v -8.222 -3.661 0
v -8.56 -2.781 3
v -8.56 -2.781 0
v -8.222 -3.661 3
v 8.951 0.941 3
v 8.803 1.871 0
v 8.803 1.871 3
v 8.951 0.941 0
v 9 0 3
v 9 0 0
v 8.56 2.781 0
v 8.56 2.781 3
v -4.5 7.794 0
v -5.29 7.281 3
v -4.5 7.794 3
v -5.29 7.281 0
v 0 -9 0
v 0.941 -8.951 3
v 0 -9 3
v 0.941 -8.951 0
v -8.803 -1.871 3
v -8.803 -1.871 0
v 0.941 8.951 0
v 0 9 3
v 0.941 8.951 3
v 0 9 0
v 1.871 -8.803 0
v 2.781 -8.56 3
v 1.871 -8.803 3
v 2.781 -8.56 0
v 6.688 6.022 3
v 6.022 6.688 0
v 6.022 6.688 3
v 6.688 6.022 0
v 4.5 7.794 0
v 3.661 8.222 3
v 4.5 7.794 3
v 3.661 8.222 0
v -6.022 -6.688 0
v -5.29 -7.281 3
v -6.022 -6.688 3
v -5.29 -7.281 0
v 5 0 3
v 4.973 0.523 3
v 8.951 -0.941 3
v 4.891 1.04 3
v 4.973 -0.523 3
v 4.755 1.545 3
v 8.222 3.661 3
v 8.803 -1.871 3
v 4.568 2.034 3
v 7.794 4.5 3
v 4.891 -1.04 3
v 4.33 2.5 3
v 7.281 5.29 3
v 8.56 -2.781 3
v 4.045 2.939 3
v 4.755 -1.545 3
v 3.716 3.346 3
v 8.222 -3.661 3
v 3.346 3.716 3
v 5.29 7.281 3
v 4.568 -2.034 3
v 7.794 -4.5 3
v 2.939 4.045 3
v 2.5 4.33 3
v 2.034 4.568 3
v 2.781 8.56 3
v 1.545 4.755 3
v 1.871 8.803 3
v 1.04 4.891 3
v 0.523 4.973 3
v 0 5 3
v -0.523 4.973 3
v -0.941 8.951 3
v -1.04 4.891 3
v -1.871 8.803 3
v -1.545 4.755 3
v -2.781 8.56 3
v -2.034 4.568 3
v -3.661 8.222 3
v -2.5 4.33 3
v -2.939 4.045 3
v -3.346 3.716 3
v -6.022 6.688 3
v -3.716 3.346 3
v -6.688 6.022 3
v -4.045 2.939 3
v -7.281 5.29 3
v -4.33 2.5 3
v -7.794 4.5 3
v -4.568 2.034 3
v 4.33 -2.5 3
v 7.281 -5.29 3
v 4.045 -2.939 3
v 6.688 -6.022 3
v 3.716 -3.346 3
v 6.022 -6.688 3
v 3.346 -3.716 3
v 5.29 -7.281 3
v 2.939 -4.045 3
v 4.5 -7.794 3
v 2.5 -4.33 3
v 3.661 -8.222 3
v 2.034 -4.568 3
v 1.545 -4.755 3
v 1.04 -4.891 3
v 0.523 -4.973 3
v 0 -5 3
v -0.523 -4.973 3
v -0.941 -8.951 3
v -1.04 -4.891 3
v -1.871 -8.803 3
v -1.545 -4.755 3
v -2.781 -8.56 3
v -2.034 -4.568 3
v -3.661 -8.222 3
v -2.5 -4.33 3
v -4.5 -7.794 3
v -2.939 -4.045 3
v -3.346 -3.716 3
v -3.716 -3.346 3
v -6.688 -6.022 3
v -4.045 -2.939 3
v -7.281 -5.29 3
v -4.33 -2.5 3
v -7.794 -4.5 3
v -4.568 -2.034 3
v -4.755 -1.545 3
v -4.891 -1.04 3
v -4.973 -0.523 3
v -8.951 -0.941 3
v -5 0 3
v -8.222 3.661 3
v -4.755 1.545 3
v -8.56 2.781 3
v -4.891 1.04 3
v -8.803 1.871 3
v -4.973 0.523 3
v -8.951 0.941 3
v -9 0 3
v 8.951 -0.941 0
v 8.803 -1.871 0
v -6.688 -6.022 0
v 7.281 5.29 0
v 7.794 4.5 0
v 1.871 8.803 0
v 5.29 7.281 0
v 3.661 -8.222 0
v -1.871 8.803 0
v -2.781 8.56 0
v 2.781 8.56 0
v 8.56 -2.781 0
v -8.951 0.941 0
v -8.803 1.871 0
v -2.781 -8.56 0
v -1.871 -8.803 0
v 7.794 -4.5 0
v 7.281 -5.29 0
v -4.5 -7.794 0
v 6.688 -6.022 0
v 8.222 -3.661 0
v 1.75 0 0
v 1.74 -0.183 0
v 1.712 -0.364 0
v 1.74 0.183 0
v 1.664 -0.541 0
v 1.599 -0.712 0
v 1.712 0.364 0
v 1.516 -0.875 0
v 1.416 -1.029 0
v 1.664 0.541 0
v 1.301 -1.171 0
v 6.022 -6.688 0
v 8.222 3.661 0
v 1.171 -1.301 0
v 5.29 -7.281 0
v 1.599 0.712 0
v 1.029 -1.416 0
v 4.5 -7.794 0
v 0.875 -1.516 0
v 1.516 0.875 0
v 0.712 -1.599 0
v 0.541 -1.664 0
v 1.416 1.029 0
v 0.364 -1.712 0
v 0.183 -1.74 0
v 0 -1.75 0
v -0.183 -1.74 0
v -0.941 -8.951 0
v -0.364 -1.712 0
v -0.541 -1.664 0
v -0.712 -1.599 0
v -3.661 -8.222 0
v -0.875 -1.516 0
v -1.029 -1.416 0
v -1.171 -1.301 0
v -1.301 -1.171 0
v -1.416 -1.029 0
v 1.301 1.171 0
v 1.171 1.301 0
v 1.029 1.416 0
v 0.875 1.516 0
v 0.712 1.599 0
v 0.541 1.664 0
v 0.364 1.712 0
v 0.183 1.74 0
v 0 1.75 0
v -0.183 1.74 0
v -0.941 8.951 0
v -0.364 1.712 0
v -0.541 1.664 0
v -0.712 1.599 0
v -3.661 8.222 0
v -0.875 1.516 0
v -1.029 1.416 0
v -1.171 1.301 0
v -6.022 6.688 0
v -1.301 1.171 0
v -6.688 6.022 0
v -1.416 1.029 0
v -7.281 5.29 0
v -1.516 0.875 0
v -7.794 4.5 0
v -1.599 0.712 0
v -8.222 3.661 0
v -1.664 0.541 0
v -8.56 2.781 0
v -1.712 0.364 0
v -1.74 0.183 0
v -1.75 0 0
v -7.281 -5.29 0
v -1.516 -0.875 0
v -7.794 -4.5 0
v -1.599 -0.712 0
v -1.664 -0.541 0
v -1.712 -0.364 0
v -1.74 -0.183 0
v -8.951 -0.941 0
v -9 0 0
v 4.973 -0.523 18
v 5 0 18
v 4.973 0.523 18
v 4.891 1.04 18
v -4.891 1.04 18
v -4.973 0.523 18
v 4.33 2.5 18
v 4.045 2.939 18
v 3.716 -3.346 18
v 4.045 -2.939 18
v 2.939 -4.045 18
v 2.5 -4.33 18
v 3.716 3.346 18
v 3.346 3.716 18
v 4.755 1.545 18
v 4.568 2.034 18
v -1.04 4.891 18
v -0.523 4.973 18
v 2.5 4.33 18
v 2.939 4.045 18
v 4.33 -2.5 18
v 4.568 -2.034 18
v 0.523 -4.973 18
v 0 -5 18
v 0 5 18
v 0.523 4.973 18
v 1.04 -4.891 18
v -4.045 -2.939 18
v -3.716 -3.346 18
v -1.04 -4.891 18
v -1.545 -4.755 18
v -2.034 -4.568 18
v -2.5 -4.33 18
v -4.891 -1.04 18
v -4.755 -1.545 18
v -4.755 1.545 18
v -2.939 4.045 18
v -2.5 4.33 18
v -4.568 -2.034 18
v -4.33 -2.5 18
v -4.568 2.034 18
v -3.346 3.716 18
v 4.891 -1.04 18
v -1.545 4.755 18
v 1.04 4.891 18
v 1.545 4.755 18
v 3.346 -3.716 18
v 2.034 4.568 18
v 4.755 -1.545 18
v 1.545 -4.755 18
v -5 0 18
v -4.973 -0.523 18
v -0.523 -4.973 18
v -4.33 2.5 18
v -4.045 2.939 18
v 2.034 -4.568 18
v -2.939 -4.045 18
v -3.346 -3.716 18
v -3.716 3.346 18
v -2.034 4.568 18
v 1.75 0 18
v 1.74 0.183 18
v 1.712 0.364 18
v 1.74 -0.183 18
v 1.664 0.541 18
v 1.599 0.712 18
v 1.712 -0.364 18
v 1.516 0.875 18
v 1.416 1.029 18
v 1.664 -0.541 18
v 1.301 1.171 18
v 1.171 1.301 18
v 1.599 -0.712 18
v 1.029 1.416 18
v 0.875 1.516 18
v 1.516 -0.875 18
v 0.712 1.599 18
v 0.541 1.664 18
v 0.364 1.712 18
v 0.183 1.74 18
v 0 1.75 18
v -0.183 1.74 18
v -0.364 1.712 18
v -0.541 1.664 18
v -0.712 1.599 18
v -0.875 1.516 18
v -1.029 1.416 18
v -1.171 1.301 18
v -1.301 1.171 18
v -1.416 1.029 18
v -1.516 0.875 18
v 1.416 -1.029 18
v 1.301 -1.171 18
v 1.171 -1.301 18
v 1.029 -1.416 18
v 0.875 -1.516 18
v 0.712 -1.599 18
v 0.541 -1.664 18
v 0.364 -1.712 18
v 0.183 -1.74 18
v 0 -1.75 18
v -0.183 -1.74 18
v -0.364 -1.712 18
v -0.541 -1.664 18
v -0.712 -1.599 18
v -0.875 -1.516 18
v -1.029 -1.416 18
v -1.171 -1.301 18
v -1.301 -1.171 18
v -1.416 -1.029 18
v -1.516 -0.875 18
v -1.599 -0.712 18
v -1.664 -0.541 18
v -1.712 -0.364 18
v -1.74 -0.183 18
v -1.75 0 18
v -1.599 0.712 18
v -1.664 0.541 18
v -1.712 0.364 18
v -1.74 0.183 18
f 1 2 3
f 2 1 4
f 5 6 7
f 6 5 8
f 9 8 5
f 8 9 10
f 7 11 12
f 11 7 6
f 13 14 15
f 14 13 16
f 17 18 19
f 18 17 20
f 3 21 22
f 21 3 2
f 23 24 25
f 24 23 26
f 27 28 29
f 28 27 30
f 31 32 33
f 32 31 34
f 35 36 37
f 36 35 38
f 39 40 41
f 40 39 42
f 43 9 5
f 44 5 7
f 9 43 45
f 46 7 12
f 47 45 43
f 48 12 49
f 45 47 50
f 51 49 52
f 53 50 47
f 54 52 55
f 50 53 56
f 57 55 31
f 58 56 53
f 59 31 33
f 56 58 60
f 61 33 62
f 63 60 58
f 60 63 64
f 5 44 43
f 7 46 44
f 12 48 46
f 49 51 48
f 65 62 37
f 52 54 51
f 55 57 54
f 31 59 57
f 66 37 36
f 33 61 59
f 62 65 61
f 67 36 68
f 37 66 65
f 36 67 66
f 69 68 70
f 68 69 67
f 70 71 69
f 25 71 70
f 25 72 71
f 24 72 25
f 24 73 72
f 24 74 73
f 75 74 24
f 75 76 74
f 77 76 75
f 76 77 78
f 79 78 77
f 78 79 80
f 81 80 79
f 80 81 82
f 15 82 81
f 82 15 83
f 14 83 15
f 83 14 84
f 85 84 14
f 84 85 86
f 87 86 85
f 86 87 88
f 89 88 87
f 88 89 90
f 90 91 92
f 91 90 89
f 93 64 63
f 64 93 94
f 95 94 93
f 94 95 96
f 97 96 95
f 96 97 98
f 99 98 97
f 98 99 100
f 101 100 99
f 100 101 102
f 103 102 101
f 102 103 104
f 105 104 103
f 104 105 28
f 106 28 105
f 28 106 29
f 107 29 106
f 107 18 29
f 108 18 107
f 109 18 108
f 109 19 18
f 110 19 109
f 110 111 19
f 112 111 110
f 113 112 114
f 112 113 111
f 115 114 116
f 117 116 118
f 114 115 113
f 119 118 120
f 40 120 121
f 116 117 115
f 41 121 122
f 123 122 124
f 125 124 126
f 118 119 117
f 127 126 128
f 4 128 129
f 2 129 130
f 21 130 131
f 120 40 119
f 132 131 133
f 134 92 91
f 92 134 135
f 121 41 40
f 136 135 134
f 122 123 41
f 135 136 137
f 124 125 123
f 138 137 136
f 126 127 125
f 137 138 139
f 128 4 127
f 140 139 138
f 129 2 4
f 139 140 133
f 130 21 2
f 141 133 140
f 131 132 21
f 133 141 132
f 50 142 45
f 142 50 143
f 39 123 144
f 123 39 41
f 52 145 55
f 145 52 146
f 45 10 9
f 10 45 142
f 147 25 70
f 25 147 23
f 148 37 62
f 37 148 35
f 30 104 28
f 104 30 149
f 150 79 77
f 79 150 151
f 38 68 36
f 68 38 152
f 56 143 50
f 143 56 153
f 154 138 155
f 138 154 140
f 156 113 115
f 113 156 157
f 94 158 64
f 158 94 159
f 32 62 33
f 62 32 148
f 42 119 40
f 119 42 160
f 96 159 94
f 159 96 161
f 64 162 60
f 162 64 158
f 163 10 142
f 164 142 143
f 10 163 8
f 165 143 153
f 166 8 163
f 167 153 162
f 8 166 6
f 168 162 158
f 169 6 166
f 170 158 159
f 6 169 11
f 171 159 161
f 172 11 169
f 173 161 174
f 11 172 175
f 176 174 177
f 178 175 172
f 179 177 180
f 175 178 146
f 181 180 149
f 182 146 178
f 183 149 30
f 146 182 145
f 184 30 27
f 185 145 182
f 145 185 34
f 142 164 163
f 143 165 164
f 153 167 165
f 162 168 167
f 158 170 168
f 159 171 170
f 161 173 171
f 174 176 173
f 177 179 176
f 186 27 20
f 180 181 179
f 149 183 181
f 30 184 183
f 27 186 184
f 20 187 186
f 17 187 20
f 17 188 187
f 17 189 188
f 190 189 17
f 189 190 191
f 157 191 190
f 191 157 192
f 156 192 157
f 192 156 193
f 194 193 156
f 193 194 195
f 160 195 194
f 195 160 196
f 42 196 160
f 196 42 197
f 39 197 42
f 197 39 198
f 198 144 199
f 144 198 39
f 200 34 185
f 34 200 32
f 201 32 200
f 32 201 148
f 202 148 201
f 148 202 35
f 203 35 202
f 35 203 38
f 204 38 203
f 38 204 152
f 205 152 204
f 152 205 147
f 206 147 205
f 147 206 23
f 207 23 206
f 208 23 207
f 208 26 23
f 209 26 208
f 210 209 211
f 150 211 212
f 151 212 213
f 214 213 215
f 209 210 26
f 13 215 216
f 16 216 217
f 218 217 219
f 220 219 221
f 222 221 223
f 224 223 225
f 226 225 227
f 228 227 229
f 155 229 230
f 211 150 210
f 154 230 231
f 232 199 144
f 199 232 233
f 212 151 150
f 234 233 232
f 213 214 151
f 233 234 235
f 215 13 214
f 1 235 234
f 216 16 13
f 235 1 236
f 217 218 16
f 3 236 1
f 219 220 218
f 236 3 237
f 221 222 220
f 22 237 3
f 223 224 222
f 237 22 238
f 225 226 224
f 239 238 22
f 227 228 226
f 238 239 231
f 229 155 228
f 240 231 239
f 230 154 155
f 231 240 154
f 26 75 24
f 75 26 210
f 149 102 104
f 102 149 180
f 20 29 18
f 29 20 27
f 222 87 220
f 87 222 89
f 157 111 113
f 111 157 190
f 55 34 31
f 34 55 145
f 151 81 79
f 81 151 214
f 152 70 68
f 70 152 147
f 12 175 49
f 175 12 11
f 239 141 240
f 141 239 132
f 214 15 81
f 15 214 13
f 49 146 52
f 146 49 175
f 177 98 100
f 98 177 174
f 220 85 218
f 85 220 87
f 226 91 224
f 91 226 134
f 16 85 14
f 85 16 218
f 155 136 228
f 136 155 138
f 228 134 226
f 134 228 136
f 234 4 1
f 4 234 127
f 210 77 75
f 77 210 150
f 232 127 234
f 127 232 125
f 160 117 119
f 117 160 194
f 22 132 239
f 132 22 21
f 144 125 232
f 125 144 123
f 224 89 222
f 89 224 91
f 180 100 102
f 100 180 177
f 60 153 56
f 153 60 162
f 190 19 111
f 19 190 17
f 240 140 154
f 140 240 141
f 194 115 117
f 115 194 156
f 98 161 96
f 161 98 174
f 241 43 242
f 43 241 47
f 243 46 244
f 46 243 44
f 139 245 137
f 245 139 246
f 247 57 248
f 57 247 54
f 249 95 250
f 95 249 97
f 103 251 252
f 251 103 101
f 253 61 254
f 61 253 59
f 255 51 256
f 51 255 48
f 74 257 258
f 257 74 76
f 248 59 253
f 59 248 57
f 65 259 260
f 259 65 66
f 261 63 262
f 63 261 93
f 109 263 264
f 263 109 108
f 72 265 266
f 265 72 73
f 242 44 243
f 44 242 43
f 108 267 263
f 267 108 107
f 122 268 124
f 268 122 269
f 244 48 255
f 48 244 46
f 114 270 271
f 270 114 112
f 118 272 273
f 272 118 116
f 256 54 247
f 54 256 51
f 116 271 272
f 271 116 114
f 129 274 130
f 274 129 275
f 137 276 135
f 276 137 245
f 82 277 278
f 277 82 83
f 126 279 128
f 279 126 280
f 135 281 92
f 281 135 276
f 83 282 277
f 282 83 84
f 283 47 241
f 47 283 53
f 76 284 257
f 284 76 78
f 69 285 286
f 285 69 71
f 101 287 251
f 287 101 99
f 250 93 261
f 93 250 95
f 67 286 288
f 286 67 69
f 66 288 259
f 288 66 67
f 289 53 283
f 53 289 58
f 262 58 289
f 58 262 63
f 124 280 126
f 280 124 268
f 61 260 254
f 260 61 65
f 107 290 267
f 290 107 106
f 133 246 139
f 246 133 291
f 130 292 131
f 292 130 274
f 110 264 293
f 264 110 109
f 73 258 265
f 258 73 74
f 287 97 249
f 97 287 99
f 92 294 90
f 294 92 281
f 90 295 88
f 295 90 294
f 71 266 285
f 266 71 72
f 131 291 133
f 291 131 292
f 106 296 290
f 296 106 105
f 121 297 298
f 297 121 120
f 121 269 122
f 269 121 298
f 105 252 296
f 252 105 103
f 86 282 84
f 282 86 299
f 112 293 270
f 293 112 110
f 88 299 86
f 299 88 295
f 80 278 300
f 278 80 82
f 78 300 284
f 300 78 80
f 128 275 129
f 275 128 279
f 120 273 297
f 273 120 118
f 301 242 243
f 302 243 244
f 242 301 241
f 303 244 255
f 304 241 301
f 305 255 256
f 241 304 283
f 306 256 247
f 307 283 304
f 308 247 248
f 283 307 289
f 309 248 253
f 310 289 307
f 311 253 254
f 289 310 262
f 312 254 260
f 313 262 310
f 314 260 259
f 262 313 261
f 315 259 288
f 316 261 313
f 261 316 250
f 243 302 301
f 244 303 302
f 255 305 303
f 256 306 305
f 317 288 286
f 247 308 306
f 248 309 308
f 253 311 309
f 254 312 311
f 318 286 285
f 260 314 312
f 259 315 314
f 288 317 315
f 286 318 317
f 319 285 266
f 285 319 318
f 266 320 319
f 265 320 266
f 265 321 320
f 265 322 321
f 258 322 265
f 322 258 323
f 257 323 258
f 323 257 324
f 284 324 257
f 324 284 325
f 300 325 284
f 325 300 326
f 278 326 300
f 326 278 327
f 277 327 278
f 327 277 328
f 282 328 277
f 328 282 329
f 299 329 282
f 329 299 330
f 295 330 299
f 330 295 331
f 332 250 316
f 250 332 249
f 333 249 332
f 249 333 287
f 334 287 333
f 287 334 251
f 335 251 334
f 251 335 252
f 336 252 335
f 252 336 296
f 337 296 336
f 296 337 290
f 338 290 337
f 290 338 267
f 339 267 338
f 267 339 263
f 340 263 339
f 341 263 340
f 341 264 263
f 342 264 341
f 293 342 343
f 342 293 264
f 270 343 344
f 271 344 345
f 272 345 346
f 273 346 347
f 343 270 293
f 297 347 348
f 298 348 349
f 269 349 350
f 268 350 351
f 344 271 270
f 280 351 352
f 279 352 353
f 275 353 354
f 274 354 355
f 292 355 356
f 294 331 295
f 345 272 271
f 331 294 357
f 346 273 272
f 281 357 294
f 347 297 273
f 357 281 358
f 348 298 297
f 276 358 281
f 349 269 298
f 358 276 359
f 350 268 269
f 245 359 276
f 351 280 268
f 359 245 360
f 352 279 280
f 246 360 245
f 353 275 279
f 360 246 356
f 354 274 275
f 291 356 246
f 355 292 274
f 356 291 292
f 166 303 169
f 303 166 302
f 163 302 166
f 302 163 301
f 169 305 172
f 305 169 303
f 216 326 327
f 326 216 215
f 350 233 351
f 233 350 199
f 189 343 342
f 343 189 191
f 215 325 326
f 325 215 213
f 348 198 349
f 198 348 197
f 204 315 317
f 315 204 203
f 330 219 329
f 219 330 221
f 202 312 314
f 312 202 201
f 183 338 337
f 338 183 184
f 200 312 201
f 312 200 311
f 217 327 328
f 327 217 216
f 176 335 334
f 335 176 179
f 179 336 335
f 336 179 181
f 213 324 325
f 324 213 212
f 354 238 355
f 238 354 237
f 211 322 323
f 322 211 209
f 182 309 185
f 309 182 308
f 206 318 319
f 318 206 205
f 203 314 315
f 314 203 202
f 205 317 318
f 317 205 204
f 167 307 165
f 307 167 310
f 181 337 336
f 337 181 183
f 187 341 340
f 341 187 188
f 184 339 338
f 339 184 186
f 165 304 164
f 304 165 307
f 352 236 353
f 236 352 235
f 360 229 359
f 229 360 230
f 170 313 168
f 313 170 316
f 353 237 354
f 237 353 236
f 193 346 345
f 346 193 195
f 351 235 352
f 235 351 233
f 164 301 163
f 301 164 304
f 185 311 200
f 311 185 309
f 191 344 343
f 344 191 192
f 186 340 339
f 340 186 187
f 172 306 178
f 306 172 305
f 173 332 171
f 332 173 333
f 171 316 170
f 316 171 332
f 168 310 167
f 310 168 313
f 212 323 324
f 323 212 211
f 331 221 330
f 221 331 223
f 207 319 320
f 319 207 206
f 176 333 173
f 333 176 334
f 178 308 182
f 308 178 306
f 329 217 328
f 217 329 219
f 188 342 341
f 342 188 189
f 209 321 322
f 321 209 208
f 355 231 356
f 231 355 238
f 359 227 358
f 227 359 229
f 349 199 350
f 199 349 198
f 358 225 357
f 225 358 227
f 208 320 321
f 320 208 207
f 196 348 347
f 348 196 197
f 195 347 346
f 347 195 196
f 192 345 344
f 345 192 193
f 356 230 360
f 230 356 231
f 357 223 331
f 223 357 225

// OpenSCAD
// Cable gland body for 3 mm cable.
$fn = 60;
eps = 0.02;
cable_d = 3;
body_d = 10;
body_l = 18;
flange_d = body_d + 8;
flange_t = 3;
difference() {
    union() { cylinder(d = flange_d, h = flange_t); cylinder(d = body_d, h = body_l); }
    translate([0, 0, -eps]) cylinder(d = cable_d + 0.5, h = body_l + 2 * eps);
}
